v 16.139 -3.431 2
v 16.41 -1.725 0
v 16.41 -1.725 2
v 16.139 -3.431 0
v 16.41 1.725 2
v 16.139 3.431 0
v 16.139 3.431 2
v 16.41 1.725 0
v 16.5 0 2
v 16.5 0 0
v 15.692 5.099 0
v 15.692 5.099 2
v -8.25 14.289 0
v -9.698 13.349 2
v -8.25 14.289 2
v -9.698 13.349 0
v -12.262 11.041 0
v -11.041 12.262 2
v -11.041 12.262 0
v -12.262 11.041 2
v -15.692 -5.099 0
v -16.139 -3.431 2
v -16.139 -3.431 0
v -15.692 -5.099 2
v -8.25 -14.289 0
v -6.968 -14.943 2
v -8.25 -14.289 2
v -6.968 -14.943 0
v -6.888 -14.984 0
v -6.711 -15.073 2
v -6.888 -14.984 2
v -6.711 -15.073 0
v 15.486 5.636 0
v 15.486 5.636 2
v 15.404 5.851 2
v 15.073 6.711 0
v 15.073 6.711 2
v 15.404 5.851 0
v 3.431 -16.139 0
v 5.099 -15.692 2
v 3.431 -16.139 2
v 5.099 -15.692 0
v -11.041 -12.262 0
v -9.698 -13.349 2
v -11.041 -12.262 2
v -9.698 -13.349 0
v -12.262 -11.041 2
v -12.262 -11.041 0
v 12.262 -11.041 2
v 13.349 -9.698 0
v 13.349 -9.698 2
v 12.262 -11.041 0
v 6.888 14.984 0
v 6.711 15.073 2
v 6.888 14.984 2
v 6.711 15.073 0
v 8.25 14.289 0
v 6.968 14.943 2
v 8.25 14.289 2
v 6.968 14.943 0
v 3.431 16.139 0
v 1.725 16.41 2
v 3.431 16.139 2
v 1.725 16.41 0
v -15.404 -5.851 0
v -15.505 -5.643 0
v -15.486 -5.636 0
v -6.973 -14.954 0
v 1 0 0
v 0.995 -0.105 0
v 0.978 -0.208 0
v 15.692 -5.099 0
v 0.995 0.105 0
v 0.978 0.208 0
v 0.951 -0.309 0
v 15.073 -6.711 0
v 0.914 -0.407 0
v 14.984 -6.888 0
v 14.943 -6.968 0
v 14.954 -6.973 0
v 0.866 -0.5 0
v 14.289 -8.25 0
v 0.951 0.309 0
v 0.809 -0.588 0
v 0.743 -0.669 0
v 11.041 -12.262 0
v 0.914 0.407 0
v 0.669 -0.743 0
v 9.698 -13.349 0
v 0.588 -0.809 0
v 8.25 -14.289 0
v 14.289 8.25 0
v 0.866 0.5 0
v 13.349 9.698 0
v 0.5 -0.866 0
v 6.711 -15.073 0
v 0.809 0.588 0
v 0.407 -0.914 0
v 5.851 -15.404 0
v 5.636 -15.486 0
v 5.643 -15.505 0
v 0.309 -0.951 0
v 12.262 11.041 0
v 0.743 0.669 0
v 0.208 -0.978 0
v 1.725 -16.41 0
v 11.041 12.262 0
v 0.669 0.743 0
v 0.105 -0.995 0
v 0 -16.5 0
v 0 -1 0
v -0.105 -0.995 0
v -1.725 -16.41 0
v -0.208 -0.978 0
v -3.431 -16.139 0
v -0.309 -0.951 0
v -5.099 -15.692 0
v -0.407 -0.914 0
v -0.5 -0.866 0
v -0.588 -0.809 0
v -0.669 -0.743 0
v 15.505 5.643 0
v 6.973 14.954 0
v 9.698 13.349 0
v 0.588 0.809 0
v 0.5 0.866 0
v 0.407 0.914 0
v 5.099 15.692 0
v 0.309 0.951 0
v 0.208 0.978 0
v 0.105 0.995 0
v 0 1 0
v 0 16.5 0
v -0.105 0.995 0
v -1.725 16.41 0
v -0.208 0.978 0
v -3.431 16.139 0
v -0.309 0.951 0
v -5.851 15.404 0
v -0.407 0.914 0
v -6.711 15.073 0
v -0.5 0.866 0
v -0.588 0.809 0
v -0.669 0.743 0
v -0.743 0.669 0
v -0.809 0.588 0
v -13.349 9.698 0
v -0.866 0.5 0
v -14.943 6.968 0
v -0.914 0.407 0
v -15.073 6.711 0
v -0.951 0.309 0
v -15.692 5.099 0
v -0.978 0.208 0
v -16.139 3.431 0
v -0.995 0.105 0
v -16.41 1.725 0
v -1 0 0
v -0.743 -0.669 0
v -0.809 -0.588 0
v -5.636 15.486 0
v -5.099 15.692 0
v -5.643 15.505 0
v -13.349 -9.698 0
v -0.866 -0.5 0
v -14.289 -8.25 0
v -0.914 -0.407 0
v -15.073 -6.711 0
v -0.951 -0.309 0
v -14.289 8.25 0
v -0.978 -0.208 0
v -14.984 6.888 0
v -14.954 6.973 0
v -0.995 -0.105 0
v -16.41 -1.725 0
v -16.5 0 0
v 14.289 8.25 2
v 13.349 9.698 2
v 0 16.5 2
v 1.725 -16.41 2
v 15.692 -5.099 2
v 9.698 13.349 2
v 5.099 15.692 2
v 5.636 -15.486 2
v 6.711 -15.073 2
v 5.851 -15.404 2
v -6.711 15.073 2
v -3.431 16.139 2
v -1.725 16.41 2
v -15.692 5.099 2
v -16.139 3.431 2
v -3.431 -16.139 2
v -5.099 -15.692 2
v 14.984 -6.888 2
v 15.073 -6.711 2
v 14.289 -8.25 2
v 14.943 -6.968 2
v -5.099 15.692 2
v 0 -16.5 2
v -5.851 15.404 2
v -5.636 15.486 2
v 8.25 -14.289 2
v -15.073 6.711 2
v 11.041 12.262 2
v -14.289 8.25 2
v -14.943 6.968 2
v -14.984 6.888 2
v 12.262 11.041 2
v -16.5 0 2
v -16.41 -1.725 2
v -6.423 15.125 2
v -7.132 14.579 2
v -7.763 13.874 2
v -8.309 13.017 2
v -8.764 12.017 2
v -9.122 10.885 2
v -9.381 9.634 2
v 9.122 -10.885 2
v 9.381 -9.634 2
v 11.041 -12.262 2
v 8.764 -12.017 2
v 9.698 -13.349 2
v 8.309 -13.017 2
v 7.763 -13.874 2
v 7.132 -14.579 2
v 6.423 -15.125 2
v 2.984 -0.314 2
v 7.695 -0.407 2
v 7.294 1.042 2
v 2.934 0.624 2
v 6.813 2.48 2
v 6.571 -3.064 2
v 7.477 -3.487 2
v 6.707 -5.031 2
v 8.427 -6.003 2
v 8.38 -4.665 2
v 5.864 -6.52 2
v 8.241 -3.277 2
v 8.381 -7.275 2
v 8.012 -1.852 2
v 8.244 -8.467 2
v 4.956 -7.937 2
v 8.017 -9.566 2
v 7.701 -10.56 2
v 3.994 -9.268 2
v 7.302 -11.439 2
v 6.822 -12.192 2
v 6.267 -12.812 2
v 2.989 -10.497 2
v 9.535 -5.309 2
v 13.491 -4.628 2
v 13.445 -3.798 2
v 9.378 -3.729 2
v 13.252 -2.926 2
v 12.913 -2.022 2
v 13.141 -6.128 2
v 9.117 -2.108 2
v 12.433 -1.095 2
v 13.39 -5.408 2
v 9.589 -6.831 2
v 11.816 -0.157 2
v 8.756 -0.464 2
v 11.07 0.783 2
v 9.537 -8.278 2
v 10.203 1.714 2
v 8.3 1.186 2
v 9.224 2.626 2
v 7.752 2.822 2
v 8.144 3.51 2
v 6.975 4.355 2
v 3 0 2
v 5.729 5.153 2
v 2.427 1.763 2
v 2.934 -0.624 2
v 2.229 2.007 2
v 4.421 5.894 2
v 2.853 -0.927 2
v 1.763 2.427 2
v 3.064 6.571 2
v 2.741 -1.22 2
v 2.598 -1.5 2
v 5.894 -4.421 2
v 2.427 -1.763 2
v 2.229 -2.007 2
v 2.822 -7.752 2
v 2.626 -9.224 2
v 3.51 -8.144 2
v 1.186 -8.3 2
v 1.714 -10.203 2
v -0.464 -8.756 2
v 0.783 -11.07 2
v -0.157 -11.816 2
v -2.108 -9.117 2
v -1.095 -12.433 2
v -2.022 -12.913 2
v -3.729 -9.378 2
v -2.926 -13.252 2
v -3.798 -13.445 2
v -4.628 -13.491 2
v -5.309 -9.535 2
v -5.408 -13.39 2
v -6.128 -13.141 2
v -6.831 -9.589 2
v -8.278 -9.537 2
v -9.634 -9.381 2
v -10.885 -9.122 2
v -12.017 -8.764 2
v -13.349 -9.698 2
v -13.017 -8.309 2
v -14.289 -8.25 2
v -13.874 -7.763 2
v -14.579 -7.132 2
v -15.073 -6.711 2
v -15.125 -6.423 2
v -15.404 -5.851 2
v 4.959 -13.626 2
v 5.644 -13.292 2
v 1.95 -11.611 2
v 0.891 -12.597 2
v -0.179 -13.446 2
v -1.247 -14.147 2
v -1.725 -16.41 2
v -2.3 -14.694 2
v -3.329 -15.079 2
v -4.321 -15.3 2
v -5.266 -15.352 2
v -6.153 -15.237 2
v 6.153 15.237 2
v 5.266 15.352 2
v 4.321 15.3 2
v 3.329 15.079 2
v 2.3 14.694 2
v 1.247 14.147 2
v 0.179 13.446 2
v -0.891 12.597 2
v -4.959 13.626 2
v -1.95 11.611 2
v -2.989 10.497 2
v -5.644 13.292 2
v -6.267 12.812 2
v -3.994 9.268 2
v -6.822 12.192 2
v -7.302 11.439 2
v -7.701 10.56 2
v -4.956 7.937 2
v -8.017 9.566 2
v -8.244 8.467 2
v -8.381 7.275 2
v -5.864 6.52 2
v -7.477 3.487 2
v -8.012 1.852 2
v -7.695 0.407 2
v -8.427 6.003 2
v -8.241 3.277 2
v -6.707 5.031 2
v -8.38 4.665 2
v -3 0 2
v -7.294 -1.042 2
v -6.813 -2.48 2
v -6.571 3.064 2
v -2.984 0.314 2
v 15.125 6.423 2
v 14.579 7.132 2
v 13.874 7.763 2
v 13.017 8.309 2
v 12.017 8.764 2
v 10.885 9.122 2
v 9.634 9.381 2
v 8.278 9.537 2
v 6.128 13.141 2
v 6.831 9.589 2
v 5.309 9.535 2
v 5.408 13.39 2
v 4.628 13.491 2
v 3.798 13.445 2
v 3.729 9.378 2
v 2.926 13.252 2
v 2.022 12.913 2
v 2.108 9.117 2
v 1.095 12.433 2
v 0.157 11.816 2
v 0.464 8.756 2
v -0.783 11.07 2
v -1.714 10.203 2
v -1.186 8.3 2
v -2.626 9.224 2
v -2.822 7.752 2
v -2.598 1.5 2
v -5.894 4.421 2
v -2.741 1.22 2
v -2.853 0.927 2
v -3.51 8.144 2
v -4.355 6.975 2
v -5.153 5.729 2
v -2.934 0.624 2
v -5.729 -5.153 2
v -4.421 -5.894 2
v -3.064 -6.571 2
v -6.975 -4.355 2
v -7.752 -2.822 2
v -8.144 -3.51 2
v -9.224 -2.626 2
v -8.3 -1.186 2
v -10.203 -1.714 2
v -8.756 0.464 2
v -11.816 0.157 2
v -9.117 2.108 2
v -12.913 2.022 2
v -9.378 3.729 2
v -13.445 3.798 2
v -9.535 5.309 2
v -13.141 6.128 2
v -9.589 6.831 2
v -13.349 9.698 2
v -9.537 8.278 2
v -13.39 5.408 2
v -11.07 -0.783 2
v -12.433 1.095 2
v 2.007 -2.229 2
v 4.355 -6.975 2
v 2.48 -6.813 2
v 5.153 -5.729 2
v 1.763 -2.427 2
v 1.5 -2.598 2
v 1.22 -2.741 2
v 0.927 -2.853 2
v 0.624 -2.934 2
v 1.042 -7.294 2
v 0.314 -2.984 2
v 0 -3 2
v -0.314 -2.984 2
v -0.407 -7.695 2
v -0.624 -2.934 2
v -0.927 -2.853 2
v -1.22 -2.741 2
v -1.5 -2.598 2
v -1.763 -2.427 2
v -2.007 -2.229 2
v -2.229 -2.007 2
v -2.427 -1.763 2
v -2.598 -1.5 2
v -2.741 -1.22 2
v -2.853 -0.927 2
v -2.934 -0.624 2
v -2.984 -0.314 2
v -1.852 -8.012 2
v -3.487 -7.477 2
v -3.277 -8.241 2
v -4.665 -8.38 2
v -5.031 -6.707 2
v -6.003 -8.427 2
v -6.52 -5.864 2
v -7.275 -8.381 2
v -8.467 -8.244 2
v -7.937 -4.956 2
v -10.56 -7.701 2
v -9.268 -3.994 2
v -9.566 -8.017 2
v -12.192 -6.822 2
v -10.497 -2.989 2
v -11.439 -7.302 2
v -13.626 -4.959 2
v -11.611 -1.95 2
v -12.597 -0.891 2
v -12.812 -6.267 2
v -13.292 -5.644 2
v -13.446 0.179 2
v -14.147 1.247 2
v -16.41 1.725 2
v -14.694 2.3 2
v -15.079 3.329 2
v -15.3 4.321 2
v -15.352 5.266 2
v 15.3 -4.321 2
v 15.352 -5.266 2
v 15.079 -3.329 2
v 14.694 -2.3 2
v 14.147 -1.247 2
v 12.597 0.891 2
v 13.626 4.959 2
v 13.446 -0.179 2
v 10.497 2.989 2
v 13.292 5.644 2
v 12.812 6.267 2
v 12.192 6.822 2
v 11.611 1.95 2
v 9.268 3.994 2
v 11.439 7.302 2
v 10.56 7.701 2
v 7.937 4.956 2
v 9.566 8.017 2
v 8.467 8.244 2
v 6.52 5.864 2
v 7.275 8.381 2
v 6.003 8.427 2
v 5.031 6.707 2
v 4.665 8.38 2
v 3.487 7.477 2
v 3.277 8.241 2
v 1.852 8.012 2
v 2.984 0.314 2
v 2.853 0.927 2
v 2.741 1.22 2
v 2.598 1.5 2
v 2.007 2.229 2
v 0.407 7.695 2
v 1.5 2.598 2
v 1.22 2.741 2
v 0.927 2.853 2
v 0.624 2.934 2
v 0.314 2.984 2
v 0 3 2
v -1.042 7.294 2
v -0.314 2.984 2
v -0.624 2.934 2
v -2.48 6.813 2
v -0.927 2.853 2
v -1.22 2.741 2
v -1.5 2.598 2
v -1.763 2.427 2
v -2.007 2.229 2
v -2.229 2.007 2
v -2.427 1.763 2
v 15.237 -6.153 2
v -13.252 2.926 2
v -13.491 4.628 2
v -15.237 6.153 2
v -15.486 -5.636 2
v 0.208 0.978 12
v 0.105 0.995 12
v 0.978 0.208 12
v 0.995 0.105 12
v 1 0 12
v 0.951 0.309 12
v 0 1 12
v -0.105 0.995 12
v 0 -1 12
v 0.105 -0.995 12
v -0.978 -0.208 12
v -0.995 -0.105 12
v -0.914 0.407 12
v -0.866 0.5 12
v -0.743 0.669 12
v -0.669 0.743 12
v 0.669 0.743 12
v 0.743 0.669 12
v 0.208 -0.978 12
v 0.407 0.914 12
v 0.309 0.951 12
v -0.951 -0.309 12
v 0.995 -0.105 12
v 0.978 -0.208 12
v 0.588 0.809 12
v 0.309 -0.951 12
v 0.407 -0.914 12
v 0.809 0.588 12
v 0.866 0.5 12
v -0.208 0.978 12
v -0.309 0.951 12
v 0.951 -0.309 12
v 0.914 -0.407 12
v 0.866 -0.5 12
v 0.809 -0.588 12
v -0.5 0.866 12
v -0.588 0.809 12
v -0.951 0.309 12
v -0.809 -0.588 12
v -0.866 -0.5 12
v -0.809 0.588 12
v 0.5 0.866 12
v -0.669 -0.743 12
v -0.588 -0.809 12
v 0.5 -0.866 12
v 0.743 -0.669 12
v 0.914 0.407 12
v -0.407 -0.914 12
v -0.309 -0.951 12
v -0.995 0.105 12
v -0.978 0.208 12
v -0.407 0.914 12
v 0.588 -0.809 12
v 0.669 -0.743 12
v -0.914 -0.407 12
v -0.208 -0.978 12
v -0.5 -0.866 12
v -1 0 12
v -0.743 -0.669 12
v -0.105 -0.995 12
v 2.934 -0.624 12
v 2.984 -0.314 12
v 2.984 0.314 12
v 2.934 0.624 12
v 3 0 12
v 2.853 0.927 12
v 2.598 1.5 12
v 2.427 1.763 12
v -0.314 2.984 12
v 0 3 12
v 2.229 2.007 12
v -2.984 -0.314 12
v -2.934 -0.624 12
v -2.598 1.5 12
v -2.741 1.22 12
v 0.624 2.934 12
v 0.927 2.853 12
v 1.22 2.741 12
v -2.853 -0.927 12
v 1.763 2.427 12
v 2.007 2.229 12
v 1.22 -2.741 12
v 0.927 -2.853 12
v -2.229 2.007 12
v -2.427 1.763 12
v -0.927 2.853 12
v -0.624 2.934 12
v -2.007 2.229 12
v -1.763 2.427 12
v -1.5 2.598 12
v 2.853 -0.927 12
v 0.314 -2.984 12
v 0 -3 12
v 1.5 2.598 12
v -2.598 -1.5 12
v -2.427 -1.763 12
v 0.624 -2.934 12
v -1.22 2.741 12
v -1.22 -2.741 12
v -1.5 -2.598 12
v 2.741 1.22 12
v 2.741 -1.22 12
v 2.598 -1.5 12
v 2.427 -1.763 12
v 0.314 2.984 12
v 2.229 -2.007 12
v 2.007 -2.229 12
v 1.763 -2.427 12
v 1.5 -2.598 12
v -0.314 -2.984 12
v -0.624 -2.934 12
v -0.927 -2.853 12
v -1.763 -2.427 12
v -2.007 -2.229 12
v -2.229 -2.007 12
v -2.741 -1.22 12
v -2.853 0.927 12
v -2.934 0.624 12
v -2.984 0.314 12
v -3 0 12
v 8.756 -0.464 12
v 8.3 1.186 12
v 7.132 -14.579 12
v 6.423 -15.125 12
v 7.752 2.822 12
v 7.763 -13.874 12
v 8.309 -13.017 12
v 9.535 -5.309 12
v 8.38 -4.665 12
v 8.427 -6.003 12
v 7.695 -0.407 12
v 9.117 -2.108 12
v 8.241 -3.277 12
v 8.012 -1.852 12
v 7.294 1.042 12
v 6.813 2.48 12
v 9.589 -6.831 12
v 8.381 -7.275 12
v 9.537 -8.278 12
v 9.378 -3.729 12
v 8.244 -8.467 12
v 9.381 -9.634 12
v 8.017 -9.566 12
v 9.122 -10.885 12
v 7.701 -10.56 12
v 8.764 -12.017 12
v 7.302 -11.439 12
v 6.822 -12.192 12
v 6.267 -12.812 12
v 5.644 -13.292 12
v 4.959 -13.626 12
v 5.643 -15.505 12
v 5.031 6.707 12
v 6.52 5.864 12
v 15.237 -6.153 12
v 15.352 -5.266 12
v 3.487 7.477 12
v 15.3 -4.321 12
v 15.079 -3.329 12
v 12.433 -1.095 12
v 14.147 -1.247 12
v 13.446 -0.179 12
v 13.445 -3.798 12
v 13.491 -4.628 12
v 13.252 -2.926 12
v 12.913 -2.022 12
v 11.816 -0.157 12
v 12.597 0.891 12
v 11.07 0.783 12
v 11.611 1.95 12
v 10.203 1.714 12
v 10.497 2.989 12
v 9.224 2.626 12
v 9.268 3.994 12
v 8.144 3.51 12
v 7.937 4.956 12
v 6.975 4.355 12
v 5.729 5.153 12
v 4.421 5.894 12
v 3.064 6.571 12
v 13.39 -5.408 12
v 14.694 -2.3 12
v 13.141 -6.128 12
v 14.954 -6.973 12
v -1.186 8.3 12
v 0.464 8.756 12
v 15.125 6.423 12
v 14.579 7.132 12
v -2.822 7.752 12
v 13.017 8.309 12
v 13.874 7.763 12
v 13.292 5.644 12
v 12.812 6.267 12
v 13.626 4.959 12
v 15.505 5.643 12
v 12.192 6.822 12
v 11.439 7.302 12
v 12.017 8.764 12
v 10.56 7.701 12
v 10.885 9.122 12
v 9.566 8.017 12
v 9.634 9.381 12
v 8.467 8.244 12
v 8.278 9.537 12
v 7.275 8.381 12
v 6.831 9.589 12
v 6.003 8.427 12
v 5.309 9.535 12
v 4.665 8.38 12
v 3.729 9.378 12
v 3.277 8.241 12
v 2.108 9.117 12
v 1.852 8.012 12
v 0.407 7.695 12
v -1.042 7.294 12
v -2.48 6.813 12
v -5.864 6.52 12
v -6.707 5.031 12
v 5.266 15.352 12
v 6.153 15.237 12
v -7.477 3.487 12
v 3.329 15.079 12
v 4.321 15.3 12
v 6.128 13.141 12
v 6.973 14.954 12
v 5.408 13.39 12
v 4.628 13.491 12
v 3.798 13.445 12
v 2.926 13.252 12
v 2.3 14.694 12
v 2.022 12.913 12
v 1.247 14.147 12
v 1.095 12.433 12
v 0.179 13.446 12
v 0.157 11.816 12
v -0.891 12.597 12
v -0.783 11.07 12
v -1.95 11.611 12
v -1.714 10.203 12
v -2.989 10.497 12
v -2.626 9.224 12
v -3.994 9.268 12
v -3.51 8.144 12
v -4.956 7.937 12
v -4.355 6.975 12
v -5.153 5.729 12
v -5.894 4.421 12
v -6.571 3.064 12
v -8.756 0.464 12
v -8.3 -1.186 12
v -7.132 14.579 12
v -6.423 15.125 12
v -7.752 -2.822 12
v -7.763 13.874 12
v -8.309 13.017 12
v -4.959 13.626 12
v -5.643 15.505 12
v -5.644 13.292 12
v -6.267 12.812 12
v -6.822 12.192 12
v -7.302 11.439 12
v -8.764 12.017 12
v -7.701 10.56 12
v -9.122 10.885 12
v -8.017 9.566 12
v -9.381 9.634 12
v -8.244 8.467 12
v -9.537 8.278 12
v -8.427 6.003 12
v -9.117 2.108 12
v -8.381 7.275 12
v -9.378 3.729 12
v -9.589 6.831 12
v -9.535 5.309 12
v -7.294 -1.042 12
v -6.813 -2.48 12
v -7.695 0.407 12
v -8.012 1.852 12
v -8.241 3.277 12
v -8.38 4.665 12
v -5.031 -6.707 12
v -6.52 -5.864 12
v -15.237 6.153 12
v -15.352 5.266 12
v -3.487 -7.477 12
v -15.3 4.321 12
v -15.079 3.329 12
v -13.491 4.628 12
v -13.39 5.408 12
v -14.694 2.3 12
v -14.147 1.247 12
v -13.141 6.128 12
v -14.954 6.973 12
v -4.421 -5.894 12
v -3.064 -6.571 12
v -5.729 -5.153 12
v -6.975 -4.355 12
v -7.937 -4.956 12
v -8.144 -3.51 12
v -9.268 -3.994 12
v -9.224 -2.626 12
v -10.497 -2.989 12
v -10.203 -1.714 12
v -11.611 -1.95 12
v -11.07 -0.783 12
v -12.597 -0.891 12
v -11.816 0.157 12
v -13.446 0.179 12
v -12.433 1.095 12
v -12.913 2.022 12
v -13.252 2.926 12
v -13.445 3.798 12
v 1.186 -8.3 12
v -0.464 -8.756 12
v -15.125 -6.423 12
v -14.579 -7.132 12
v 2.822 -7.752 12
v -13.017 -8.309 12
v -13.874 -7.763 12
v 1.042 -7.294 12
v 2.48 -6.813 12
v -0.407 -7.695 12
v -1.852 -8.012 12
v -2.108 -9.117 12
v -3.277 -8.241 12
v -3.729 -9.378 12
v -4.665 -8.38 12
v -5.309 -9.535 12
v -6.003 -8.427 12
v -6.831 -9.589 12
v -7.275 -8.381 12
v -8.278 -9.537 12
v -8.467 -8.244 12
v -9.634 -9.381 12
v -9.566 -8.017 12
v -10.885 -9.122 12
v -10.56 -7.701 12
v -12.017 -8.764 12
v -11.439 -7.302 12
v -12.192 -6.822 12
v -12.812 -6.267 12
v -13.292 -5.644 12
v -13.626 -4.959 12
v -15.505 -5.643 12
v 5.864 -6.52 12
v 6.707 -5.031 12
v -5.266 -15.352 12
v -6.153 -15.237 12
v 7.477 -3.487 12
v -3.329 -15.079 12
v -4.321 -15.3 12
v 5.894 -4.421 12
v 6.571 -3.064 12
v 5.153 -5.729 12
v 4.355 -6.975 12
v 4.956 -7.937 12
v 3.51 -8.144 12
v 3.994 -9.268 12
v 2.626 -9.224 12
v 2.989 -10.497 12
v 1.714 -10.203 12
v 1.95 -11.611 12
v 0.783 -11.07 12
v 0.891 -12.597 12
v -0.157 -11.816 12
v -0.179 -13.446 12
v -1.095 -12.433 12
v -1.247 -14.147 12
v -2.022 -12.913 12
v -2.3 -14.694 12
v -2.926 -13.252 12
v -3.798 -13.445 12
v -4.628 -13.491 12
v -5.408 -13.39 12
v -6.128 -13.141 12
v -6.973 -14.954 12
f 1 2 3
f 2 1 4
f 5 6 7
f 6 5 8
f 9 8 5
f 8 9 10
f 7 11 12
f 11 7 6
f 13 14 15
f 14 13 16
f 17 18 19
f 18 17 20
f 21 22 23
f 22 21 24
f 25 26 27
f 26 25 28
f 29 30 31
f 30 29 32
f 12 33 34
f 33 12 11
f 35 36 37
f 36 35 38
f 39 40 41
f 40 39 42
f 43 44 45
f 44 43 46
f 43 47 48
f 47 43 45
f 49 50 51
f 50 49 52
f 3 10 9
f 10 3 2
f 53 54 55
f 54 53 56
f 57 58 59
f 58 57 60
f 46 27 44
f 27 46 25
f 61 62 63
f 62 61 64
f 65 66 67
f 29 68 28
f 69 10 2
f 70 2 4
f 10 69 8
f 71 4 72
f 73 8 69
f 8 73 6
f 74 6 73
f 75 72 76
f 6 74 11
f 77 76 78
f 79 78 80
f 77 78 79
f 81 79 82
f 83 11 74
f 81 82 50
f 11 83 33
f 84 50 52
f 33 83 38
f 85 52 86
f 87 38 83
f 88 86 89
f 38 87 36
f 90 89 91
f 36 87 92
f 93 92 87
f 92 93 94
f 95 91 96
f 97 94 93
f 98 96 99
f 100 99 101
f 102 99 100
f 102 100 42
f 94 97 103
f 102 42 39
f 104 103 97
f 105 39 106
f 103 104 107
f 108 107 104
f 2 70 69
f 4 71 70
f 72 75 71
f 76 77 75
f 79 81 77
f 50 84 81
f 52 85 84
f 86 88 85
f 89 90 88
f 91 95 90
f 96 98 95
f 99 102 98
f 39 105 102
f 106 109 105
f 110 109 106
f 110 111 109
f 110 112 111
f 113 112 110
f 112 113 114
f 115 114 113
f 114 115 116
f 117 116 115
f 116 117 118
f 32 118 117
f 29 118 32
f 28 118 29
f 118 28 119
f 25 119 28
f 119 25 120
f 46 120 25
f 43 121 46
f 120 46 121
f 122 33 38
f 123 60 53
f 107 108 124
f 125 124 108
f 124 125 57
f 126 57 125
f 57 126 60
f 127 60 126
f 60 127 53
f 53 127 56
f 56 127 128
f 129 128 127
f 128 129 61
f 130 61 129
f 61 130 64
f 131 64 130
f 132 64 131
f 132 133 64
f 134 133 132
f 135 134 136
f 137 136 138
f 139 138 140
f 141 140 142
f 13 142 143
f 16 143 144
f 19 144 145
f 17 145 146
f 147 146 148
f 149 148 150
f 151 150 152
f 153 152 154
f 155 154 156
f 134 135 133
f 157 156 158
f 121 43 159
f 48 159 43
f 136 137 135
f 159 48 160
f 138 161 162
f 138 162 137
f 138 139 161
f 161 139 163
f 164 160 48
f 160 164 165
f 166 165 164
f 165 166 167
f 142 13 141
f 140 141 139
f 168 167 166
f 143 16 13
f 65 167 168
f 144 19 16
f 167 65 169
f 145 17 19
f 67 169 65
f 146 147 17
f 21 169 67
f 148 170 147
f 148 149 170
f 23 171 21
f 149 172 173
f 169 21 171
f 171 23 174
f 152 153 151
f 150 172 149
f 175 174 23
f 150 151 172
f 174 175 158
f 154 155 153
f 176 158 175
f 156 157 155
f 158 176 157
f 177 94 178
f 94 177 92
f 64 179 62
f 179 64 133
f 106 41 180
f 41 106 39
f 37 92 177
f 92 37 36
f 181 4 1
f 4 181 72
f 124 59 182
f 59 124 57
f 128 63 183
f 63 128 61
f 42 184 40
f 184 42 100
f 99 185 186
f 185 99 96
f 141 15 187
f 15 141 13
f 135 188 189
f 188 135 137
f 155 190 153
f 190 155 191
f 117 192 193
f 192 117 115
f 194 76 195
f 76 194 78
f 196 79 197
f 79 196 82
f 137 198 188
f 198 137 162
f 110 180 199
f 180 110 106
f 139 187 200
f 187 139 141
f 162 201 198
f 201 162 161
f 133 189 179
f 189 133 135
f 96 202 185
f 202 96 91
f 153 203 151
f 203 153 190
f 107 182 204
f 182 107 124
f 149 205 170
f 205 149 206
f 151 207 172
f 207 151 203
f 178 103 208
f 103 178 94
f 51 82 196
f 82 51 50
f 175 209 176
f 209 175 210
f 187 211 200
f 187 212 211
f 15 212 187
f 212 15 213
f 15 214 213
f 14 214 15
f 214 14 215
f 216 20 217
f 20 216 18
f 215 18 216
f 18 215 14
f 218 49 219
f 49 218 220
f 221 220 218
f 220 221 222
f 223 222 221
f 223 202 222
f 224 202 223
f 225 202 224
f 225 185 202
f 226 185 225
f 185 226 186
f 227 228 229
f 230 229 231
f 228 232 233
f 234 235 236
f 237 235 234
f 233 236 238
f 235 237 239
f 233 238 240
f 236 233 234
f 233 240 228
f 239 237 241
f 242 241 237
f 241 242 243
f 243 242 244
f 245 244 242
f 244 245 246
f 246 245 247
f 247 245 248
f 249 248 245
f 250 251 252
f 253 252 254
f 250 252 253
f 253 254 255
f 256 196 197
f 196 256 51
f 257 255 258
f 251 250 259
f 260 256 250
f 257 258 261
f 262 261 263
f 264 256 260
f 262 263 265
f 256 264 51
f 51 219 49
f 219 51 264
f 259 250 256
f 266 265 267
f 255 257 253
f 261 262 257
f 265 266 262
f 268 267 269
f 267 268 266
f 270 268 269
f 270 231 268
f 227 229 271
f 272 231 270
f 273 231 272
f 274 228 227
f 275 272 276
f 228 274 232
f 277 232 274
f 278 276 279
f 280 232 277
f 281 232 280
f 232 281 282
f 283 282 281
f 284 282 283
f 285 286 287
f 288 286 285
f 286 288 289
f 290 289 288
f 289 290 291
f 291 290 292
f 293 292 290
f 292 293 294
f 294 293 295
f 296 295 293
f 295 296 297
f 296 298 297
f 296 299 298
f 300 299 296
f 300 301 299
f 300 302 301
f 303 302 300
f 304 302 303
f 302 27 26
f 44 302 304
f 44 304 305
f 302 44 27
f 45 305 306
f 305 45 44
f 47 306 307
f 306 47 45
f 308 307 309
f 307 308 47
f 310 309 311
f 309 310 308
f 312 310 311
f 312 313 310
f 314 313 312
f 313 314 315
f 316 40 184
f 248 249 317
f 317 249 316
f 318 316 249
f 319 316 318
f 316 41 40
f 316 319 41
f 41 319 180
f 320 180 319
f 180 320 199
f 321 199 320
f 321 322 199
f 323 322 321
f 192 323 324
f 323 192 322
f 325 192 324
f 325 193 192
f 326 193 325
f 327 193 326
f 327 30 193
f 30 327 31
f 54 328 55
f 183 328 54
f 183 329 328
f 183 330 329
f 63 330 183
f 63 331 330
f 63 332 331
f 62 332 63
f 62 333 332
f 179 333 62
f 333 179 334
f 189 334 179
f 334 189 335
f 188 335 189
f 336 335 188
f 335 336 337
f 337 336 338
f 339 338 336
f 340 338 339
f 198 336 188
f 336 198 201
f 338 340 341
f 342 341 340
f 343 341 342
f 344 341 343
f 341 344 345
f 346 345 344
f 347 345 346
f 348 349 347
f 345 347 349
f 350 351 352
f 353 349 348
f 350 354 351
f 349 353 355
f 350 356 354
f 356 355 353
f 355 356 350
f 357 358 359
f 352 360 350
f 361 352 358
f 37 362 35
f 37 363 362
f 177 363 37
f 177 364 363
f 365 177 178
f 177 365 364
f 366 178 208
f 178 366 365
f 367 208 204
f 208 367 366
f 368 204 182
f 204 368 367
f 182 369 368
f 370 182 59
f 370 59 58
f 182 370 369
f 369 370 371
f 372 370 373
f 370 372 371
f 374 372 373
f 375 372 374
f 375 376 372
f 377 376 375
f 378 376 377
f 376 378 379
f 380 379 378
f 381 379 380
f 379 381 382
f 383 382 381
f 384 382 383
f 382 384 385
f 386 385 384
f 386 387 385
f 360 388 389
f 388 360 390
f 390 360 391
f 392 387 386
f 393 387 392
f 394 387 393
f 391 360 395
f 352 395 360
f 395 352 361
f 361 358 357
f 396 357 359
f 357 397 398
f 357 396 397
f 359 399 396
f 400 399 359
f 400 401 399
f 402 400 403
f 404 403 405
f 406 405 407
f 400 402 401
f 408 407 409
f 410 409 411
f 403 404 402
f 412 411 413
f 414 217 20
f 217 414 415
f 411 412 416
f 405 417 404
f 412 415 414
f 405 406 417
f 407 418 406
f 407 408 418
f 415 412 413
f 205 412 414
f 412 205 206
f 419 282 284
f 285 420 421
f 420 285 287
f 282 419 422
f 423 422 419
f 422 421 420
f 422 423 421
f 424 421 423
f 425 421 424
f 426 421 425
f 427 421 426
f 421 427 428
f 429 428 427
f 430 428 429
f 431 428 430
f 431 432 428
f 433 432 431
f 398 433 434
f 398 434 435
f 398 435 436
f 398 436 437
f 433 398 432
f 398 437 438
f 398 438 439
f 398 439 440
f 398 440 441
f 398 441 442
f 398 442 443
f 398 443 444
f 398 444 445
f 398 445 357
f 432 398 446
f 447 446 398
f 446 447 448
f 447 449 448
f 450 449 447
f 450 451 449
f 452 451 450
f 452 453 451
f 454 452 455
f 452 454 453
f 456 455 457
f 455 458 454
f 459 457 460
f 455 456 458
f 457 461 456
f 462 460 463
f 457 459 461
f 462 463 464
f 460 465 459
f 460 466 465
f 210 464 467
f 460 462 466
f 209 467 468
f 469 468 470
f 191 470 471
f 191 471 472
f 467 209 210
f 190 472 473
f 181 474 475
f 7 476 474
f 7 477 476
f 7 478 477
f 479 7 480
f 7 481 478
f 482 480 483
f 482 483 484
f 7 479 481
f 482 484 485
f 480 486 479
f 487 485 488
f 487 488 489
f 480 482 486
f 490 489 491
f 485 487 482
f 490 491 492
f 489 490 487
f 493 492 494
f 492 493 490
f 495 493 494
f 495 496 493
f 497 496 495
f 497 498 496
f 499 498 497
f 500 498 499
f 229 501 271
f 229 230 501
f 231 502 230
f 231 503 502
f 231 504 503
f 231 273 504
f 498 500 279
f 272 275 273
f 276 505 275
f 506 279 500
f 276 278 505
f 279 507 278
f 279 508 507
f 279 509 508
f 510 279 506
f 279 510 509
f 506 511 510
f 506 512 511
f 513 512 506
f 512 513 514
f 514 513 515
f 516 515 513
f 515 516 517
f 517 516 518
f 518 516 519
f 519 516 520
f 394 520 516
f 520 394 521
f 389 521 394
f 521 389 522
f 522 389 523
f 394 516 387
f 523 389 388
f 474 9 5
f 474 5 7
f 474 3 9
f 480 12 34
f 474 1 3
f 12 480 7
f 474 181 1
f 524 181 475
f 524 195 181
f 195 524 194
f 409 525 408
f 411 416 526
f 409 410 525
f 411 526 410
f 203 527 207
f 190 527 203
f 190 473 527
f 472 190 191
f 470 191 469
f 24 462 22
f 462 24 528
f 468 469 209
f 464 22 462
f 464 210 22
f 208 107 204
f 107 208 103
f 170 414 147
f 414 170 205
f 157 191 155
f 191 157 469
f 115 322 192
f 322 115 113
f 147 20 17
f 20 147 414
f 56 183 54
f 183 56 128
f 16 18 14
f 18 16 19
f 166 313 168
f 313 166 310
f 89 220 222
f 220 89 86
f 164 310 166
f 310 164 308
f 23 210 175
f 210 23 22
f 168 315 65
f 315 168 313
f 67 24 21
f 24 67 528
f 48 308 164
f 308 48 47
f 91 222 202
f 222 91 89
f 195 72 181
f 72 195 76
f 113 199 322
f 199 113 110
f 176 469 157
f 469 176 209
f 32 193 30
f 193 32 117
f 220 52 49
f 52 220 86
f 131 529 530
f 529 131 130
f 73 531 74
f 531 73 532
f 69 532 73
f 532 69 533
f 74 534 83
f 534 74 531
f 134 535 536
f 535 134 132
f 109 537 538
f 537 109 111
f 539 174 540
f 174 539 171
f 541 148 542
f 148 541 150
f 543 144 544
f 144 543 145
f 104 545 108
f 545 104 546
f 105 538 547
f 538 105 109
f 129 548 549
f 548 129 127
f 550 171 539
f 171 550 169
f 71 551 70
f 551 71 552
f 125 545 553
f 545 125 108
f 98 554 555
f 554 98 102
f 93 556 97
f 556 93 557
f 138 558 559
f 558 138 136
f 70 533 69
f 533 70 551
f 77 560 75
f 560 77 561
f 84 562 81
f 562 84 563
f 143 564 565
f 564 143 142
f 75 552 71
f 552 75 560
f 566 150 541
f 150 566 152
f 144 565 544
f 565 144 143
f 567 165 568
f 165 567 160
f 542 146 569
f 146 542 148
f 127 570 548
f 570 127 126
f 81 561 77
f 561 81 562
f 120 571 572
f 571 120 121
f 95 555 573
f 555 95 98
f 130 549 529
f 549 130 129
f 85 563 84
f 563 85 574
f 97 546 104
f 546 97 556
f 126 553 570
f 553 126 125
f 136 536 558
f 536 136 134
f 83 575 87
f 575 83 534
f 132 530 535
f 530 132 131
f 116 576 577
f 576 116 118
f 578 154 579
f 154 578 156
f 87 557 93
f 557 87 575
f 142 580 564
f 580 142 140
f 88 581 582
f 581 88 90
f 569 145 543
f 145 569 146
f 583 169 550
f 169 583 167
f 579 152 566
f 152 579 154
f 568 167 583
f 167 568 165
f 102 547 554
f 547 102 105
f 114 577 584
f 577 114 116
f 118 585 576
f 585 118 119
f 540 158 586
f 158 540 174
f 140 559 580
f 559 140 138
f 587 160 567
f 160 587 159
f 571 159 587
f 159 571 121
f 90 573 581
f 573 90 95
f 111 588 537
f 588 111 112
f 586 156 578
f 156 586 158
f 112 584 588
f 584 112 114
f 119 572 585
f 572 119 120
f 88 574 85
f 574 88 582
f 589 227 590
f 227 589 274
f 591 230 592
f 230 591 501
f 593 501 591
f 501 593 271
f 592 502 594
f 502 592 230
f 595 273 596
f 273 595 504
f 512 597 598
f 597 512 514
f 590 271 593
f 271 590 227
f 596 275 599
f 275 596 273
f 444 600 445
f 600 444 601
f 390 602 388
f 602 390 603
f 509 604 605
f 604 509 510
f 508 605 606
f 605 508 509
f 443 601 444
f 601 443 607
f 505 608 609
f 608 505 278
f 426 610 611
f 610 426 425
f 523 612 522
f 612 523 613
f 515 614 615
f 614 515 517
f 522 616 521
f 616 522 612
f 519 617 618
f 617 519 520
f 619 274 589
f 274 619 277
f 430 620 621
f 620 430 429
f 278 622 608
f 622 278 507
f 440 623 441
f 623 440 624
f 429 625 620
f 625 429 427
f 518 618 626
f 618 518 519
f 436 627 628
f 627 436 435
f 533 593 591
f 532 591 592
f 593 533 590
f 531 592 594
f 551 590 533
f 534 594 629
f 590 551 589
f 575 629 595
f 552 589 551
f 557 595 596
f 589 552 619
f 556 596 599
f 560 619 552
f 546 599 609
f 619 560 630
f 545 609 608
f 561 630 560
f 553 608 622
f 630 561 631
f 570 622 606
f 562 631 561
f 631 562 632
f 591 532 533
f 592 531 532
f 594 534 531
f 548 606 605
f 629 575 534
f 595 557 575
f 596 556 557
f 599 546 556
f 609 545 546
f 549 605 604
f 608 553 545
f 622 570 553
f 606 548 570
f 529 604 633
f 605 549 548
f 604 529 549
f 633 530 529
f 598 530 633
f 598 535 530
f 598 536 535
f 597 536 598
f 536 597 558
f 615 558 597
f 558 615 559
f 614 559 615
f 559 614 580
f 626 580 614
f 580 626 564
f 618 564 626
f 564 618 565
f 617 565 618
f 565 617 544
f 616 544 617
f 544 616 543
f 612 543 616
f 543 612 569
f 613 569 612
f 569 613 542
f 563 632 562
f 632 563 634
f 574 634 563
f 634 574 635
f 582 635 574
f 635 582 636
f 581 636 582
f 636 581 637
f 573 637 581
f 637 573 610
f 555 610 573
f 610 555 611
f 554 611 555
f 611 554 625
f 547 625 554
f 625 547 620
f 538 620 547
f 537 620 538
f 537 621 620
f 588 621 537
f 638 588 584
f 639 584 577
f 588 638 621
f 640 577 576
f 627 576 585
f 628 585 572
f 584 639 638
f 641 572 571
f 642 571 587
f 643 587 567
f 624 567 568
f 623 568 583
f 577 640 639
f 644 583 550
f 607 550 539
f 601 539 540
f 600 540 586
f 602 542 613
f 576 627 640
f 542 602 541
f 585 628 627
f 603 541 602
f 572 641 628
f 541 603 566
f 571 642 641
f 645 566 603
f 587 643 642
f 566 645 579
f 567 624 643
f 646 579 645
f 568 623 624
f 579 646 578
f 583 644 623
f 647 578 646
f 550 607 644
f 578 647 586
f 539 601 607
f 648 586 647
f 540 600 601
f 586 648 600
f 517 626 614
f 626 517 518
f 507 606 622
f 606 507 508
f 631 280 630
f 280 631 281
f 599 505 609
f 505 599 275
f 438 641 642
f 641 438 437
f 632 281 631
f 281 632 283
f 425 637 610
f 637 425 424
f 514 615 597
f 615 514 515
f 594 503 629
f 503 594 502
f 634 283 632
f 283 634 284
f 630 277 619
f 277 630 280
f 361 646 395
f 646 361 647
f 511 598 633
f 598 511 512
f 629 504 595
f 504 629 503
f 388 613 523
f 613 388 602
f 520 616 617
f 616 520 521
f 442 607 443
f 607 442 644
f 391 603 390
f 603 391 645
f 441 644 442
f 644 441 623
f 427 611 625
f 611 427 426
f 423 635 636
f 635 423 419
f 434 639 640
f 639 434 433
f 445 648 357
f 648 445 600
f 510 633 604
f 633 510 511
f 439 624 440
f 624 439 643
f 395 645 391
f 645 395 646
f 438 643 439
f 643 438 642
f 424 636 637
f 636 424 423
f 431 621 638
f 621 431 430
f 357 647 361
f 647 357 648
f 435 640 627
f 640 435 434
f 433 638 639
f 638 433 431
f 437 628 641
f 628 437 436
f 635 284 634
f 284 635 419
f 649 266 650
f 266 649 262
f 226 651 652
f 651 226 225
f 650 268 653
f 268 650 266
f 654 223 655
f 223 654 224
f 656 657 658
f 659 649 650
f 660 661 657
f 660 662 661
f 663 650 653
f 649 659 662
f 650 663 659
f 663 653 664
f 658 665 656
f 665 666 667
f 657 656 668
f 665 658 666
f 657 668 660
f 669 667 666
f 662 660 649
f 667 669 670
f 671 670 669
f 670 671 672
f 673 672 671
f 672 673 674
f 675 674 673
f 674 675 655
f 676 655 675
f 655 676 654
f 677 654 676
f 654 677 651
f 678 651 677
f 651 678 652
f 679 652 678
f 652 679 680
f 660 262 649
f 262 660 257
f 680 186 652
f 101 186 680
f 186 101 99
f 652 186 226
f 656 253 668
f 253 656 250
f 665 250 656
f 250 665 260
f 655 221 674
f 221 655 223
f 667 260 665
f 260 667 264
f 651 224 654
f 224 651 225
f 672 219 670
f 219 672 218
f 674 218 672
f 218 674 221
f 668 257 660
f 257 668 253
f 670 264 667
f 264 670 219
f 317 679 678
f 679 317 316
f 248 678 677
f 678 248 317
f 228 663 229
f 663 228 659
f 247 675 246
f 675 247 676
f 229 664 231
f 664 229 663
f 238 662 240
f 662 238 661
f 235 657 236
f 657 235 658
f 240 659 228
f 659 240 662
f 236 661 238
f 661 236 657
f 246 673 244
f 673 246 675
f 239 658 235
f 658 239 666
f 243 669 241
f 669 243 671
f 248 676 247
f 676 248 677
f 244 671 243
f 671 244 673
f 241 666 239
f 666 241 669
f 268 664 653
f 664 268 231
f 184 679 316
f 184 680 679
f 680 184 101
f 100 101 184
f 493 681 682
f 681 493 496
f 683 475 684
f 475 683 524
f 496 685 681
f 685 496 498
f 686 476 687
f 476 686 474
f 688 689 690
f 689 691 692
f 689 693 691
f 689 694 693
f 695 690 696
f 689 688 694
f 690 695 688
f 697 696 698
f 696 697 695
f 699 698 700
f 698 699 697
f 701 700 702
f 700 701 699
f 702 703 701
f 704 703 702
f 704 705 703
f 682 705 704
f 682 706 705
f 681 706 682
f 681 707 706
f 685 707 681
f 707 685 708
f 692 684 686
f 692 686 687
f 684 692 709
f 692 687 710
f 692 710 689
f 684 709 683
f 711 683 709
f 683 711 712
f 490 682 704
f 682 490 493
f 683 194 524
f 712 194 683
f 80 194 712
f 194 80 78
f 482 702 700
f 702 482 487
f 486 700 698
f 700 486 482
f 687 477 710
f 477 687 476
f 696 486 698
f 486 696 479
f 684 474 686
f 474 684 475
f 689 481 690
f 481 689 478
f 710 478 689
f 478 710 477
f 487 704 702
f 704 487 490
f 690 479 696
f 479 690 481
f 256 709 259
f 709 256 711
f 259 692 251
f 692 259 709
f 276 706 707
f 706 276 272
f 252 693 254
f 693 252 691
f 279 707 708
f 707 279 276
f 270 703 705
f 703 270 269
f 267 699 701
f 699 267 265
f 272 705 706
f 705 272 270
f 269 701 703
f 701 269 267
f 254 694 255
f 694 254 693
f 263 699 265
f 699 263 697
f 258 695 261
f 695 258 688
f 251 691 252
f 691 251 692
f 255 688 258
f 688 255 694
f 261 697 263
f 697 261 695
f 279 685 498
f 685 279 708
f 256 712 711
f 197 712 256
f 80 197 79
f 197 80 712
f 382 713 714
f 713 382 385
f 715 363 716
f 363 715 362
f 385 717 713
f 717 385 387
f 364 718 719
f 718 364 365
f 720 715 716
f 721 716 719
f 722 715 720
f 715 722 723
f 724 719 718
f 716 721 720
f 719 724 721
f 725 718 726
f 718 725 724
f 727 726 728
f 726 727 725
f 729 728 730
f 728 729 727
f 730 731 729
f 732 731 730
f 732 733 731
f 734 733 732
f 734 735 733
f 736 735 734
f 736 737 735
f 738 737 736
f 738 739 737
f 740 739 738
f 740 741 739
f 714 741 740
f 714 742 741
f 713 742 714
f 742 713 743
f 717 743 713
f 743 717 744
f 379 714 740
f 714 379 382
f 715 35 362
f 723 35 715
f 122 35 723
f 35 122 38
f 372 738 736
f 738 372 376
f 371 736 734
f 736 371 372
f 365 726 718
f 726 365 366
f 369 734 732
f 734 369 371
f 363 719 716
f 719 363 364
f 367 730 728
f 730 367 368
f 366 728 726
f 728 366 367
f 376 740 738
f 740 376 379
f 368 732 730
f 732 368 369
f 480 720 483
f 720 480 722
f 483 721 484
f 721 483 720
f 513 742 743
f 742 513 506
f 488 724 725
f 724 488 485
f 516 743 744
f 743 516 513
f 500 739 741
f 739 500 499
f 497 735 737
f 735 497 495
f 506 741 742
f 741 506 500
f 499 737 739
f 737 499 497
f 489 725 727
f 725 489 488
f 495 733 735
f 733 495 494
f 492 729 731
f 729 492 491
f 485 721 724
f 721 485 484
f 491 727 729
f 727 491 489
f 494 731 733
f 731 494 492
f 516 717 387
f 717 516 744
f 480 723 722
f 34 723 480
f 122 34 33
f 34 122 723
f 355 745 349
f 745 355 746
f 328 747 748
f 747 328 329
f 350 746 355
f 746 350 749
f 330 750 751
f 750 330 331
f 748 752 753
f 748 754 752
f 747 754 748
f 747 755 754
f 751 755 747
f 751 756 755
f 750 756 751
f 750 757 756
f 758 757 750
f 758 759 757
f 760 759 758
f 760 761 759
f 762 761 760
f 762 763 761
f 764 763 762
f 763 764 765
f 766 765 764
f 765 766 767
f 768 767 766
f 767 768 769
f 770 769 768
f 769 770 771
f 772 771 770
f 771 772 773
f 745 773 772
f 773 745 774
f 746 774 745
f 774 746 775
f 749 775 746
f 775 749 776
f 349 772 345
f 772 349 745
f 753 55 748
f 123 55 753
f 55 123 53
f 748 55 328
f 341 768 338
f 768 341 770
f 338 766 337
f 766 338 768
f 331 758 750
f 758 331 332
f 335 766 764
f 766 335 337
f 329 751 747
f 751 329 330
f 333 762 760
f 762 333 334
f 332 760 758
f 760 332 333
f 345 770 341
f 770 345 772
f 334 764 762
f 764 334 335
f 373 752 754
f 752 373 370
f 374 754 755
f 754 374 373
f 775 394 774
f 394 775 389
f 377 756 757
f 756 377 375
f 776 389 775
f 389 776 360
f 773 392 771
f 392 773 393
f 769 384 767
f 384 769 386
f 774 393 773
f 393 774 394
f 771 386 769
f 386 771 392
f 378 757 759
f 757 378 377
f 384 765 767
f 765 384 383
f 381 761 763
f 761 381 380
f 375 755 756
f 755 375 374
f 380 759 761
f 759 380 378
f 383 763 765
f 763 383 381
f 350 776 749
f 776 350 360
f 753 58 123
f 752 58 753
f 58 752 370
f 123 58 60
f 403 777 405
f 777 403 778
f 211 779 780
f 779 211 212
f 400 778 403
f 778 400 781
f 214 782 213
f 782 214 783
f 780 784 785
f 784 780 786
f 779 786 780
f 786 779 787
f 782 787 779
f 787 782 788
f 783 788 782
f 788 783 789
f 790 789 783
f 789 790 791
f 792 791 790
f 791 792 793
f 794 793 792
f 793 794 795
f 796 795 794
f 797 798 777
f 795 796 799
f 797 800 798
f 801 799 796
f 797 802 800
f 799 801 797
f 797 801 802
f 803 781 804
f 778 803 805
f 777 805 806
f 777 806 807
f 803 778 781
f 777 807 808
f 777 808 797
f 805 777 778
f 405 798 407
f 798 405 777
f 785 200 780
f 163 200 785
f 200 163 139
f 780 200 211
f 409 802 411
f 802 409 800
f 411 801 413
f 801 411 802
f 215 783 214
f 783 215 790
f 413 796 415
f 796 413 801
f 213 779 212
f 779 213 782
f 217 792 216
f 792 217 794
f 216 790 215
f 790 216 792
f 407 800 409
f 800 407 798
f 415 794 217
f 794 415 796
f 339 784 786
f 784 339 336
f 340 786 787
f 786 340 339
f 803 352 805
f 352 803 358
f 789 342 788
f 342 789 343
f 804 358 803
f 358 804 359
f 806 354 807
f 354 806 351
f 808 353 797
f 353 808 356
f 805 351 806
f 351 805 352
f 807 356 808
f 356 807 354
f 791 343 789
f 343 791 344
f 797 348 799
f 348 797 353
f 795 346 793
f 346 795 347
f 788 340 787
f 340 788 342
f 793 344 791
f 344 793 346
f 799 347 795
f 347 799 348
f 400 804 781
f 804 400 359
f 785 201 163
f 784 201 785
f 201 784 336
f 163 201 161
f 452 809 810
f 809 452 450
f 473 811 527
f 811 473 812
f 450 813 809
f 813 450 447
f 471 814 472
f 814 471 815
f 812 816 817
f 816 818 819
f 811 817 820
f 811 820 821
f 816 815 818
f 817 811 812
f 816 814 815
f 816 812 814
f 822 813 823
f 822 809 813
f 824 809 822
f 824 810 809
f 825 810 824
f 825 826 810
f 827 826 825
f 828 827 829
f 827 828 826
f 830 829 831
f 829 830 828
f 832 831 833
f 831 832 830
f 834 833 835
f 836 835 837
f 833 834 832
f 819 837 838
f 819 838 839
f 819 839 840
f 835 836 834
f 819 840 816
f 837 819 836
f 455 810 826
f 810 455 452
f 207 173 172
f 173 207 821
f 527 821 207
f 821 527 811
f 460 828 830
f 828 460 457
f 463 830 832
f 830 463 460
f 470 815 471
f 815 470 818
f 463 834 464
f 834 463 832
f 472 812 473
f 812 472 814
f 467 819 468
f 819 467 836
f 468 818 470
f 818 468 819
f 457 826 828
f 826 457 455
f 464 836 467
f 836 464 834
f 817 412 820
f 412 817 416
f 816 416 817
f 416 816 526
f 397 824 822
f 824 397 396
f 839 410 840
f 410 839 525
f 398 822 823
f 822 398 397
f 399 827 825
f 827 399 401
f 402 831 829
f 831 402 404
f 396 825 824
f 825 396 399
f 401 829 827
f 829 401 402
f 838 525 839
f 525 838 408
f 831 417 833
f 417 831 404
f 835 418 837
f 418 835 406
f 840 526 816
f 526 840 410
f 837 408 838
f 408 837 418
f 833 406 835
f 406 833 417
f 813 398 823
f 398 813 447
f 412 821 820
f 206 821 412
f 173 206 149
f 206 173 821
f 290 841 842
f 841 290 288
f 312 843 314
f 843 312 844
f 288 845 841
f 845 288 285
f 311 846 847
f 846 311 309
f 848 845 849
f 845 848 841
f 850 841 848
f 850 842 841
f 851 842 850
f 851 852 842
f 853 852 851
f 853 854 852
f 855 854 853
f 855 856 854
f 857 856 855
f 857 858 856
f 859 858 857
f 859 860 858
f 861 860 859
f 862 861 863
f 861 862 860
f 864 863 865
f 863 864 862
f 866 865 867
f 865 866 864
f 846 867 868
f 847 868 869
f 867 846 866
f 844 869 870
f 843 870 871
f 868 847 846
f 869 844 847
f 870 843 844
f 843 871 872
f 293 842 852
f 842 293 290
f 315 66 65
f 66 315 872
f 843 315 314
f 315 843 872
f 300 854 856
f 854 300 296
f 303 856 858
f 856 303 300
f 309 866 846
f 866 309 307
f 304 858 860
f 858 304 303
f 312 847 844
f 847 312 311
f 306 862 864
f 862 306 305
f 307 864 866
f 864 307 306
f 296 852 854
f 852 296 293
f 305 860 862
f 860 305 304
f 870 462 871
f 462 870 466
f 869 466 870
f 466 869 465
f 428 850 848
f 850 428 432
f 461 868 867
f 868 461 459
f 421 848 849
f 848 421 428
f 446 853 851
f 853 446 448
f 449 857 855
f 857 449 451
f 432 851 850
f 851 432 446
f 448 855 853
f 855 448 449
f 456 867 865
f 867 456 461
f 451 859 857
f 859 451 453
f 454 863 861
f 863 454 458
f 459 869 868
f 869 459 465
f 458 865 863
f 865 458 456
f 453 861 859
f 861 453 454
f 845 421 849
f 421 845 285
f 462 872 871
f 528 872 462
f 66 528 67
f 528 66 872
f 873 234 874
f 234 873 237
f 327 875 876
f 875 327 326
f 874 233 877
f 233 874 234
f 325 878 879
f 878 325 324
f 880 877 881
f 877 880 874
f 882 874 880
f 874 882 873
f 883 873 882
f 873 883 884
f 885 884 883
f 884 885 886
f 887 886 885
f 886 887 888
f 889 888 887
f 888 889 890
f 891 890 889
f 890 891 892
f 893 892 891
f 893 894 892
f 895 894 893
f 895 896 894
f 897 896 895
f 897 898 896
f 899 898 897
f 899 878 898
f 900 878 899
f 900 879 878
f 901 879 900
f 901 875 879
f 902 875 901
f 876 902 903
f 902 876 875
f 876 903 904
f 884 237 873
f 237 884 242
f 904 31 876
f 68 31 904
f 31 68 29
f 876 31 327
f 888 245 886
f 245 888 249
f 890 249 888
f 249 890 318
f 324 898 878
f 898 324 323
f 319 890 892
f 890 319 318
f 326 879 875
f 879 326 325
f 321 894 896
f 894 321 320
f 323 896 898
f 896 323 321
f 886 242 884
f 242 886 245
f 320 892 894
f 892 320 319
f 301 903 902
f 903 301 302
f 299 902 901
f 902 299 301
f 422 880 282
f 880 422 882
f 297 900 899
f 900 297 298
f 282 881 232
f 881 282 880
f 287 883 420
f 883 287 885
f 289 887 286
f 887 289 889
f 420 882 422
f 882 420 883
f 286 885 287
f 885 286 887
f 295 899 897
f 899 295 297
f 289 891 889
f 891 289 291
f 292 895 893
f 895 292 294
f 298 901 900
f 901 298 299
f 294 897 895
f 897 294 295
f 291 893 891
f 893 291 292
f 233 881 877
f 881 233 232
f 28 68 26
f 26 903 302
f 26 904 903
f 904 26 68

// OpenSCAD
// Radial Ventilator
$fn = 60;

/* [ Maße ] */
Durchmesser = 33;
Hohe = 12;
Wandstarke = 2;
Motorachse = 2;
Flugelwand = 1;

/* [ Komponenten] */
show_ventilator = true;

// Steuerung für Druck --------------------------

if (show_ventilator) ventilator();
    

// Module ---------------------------------------
module ventilator() {
    Lochscheibe();
    for (i=[0,1,2,3,4,5,6,7])
    rotate([0,0,i*360/8])Flugel();
}

module Lochscheibe() {
    difference() {
        translate([0,0,Wandstarke/2])
        cylinder(d=Durchmesser, h=Wandstarke, center=true);
        cylinder(d=Motorachse, h=Wandstarke+2, center=true); 
    }
        translate([0,0,Hohe/2])
        difference() {
            cylinder(d=Motorachse*3, h=Hohe, center=true); 
            cylinder(d=Motorachse, h=Hohe+2, center=true); 
        }
}

module Flugel() {
        rotate([0,0,20])
        translate([0,0,Hohe/2])
        scale([1,2,1])
    difference() {
        cylinder(d=Durchmesser/2, h=Hohe, center=true);
        cylinder(d=Durchmesser/2-2*Flugelwand, h=Hohe+Wandstarke, center=true);
        translate([0,Durchmesser/4,0])
        cube([Durchmesser,Durchmesser/2,Hohe+1], center=true);
        translate([-Durchmesser/4,0,0])
        cube([Durchmesser/2,Durchmesser,Hohe+1], center=true);
       }
}
